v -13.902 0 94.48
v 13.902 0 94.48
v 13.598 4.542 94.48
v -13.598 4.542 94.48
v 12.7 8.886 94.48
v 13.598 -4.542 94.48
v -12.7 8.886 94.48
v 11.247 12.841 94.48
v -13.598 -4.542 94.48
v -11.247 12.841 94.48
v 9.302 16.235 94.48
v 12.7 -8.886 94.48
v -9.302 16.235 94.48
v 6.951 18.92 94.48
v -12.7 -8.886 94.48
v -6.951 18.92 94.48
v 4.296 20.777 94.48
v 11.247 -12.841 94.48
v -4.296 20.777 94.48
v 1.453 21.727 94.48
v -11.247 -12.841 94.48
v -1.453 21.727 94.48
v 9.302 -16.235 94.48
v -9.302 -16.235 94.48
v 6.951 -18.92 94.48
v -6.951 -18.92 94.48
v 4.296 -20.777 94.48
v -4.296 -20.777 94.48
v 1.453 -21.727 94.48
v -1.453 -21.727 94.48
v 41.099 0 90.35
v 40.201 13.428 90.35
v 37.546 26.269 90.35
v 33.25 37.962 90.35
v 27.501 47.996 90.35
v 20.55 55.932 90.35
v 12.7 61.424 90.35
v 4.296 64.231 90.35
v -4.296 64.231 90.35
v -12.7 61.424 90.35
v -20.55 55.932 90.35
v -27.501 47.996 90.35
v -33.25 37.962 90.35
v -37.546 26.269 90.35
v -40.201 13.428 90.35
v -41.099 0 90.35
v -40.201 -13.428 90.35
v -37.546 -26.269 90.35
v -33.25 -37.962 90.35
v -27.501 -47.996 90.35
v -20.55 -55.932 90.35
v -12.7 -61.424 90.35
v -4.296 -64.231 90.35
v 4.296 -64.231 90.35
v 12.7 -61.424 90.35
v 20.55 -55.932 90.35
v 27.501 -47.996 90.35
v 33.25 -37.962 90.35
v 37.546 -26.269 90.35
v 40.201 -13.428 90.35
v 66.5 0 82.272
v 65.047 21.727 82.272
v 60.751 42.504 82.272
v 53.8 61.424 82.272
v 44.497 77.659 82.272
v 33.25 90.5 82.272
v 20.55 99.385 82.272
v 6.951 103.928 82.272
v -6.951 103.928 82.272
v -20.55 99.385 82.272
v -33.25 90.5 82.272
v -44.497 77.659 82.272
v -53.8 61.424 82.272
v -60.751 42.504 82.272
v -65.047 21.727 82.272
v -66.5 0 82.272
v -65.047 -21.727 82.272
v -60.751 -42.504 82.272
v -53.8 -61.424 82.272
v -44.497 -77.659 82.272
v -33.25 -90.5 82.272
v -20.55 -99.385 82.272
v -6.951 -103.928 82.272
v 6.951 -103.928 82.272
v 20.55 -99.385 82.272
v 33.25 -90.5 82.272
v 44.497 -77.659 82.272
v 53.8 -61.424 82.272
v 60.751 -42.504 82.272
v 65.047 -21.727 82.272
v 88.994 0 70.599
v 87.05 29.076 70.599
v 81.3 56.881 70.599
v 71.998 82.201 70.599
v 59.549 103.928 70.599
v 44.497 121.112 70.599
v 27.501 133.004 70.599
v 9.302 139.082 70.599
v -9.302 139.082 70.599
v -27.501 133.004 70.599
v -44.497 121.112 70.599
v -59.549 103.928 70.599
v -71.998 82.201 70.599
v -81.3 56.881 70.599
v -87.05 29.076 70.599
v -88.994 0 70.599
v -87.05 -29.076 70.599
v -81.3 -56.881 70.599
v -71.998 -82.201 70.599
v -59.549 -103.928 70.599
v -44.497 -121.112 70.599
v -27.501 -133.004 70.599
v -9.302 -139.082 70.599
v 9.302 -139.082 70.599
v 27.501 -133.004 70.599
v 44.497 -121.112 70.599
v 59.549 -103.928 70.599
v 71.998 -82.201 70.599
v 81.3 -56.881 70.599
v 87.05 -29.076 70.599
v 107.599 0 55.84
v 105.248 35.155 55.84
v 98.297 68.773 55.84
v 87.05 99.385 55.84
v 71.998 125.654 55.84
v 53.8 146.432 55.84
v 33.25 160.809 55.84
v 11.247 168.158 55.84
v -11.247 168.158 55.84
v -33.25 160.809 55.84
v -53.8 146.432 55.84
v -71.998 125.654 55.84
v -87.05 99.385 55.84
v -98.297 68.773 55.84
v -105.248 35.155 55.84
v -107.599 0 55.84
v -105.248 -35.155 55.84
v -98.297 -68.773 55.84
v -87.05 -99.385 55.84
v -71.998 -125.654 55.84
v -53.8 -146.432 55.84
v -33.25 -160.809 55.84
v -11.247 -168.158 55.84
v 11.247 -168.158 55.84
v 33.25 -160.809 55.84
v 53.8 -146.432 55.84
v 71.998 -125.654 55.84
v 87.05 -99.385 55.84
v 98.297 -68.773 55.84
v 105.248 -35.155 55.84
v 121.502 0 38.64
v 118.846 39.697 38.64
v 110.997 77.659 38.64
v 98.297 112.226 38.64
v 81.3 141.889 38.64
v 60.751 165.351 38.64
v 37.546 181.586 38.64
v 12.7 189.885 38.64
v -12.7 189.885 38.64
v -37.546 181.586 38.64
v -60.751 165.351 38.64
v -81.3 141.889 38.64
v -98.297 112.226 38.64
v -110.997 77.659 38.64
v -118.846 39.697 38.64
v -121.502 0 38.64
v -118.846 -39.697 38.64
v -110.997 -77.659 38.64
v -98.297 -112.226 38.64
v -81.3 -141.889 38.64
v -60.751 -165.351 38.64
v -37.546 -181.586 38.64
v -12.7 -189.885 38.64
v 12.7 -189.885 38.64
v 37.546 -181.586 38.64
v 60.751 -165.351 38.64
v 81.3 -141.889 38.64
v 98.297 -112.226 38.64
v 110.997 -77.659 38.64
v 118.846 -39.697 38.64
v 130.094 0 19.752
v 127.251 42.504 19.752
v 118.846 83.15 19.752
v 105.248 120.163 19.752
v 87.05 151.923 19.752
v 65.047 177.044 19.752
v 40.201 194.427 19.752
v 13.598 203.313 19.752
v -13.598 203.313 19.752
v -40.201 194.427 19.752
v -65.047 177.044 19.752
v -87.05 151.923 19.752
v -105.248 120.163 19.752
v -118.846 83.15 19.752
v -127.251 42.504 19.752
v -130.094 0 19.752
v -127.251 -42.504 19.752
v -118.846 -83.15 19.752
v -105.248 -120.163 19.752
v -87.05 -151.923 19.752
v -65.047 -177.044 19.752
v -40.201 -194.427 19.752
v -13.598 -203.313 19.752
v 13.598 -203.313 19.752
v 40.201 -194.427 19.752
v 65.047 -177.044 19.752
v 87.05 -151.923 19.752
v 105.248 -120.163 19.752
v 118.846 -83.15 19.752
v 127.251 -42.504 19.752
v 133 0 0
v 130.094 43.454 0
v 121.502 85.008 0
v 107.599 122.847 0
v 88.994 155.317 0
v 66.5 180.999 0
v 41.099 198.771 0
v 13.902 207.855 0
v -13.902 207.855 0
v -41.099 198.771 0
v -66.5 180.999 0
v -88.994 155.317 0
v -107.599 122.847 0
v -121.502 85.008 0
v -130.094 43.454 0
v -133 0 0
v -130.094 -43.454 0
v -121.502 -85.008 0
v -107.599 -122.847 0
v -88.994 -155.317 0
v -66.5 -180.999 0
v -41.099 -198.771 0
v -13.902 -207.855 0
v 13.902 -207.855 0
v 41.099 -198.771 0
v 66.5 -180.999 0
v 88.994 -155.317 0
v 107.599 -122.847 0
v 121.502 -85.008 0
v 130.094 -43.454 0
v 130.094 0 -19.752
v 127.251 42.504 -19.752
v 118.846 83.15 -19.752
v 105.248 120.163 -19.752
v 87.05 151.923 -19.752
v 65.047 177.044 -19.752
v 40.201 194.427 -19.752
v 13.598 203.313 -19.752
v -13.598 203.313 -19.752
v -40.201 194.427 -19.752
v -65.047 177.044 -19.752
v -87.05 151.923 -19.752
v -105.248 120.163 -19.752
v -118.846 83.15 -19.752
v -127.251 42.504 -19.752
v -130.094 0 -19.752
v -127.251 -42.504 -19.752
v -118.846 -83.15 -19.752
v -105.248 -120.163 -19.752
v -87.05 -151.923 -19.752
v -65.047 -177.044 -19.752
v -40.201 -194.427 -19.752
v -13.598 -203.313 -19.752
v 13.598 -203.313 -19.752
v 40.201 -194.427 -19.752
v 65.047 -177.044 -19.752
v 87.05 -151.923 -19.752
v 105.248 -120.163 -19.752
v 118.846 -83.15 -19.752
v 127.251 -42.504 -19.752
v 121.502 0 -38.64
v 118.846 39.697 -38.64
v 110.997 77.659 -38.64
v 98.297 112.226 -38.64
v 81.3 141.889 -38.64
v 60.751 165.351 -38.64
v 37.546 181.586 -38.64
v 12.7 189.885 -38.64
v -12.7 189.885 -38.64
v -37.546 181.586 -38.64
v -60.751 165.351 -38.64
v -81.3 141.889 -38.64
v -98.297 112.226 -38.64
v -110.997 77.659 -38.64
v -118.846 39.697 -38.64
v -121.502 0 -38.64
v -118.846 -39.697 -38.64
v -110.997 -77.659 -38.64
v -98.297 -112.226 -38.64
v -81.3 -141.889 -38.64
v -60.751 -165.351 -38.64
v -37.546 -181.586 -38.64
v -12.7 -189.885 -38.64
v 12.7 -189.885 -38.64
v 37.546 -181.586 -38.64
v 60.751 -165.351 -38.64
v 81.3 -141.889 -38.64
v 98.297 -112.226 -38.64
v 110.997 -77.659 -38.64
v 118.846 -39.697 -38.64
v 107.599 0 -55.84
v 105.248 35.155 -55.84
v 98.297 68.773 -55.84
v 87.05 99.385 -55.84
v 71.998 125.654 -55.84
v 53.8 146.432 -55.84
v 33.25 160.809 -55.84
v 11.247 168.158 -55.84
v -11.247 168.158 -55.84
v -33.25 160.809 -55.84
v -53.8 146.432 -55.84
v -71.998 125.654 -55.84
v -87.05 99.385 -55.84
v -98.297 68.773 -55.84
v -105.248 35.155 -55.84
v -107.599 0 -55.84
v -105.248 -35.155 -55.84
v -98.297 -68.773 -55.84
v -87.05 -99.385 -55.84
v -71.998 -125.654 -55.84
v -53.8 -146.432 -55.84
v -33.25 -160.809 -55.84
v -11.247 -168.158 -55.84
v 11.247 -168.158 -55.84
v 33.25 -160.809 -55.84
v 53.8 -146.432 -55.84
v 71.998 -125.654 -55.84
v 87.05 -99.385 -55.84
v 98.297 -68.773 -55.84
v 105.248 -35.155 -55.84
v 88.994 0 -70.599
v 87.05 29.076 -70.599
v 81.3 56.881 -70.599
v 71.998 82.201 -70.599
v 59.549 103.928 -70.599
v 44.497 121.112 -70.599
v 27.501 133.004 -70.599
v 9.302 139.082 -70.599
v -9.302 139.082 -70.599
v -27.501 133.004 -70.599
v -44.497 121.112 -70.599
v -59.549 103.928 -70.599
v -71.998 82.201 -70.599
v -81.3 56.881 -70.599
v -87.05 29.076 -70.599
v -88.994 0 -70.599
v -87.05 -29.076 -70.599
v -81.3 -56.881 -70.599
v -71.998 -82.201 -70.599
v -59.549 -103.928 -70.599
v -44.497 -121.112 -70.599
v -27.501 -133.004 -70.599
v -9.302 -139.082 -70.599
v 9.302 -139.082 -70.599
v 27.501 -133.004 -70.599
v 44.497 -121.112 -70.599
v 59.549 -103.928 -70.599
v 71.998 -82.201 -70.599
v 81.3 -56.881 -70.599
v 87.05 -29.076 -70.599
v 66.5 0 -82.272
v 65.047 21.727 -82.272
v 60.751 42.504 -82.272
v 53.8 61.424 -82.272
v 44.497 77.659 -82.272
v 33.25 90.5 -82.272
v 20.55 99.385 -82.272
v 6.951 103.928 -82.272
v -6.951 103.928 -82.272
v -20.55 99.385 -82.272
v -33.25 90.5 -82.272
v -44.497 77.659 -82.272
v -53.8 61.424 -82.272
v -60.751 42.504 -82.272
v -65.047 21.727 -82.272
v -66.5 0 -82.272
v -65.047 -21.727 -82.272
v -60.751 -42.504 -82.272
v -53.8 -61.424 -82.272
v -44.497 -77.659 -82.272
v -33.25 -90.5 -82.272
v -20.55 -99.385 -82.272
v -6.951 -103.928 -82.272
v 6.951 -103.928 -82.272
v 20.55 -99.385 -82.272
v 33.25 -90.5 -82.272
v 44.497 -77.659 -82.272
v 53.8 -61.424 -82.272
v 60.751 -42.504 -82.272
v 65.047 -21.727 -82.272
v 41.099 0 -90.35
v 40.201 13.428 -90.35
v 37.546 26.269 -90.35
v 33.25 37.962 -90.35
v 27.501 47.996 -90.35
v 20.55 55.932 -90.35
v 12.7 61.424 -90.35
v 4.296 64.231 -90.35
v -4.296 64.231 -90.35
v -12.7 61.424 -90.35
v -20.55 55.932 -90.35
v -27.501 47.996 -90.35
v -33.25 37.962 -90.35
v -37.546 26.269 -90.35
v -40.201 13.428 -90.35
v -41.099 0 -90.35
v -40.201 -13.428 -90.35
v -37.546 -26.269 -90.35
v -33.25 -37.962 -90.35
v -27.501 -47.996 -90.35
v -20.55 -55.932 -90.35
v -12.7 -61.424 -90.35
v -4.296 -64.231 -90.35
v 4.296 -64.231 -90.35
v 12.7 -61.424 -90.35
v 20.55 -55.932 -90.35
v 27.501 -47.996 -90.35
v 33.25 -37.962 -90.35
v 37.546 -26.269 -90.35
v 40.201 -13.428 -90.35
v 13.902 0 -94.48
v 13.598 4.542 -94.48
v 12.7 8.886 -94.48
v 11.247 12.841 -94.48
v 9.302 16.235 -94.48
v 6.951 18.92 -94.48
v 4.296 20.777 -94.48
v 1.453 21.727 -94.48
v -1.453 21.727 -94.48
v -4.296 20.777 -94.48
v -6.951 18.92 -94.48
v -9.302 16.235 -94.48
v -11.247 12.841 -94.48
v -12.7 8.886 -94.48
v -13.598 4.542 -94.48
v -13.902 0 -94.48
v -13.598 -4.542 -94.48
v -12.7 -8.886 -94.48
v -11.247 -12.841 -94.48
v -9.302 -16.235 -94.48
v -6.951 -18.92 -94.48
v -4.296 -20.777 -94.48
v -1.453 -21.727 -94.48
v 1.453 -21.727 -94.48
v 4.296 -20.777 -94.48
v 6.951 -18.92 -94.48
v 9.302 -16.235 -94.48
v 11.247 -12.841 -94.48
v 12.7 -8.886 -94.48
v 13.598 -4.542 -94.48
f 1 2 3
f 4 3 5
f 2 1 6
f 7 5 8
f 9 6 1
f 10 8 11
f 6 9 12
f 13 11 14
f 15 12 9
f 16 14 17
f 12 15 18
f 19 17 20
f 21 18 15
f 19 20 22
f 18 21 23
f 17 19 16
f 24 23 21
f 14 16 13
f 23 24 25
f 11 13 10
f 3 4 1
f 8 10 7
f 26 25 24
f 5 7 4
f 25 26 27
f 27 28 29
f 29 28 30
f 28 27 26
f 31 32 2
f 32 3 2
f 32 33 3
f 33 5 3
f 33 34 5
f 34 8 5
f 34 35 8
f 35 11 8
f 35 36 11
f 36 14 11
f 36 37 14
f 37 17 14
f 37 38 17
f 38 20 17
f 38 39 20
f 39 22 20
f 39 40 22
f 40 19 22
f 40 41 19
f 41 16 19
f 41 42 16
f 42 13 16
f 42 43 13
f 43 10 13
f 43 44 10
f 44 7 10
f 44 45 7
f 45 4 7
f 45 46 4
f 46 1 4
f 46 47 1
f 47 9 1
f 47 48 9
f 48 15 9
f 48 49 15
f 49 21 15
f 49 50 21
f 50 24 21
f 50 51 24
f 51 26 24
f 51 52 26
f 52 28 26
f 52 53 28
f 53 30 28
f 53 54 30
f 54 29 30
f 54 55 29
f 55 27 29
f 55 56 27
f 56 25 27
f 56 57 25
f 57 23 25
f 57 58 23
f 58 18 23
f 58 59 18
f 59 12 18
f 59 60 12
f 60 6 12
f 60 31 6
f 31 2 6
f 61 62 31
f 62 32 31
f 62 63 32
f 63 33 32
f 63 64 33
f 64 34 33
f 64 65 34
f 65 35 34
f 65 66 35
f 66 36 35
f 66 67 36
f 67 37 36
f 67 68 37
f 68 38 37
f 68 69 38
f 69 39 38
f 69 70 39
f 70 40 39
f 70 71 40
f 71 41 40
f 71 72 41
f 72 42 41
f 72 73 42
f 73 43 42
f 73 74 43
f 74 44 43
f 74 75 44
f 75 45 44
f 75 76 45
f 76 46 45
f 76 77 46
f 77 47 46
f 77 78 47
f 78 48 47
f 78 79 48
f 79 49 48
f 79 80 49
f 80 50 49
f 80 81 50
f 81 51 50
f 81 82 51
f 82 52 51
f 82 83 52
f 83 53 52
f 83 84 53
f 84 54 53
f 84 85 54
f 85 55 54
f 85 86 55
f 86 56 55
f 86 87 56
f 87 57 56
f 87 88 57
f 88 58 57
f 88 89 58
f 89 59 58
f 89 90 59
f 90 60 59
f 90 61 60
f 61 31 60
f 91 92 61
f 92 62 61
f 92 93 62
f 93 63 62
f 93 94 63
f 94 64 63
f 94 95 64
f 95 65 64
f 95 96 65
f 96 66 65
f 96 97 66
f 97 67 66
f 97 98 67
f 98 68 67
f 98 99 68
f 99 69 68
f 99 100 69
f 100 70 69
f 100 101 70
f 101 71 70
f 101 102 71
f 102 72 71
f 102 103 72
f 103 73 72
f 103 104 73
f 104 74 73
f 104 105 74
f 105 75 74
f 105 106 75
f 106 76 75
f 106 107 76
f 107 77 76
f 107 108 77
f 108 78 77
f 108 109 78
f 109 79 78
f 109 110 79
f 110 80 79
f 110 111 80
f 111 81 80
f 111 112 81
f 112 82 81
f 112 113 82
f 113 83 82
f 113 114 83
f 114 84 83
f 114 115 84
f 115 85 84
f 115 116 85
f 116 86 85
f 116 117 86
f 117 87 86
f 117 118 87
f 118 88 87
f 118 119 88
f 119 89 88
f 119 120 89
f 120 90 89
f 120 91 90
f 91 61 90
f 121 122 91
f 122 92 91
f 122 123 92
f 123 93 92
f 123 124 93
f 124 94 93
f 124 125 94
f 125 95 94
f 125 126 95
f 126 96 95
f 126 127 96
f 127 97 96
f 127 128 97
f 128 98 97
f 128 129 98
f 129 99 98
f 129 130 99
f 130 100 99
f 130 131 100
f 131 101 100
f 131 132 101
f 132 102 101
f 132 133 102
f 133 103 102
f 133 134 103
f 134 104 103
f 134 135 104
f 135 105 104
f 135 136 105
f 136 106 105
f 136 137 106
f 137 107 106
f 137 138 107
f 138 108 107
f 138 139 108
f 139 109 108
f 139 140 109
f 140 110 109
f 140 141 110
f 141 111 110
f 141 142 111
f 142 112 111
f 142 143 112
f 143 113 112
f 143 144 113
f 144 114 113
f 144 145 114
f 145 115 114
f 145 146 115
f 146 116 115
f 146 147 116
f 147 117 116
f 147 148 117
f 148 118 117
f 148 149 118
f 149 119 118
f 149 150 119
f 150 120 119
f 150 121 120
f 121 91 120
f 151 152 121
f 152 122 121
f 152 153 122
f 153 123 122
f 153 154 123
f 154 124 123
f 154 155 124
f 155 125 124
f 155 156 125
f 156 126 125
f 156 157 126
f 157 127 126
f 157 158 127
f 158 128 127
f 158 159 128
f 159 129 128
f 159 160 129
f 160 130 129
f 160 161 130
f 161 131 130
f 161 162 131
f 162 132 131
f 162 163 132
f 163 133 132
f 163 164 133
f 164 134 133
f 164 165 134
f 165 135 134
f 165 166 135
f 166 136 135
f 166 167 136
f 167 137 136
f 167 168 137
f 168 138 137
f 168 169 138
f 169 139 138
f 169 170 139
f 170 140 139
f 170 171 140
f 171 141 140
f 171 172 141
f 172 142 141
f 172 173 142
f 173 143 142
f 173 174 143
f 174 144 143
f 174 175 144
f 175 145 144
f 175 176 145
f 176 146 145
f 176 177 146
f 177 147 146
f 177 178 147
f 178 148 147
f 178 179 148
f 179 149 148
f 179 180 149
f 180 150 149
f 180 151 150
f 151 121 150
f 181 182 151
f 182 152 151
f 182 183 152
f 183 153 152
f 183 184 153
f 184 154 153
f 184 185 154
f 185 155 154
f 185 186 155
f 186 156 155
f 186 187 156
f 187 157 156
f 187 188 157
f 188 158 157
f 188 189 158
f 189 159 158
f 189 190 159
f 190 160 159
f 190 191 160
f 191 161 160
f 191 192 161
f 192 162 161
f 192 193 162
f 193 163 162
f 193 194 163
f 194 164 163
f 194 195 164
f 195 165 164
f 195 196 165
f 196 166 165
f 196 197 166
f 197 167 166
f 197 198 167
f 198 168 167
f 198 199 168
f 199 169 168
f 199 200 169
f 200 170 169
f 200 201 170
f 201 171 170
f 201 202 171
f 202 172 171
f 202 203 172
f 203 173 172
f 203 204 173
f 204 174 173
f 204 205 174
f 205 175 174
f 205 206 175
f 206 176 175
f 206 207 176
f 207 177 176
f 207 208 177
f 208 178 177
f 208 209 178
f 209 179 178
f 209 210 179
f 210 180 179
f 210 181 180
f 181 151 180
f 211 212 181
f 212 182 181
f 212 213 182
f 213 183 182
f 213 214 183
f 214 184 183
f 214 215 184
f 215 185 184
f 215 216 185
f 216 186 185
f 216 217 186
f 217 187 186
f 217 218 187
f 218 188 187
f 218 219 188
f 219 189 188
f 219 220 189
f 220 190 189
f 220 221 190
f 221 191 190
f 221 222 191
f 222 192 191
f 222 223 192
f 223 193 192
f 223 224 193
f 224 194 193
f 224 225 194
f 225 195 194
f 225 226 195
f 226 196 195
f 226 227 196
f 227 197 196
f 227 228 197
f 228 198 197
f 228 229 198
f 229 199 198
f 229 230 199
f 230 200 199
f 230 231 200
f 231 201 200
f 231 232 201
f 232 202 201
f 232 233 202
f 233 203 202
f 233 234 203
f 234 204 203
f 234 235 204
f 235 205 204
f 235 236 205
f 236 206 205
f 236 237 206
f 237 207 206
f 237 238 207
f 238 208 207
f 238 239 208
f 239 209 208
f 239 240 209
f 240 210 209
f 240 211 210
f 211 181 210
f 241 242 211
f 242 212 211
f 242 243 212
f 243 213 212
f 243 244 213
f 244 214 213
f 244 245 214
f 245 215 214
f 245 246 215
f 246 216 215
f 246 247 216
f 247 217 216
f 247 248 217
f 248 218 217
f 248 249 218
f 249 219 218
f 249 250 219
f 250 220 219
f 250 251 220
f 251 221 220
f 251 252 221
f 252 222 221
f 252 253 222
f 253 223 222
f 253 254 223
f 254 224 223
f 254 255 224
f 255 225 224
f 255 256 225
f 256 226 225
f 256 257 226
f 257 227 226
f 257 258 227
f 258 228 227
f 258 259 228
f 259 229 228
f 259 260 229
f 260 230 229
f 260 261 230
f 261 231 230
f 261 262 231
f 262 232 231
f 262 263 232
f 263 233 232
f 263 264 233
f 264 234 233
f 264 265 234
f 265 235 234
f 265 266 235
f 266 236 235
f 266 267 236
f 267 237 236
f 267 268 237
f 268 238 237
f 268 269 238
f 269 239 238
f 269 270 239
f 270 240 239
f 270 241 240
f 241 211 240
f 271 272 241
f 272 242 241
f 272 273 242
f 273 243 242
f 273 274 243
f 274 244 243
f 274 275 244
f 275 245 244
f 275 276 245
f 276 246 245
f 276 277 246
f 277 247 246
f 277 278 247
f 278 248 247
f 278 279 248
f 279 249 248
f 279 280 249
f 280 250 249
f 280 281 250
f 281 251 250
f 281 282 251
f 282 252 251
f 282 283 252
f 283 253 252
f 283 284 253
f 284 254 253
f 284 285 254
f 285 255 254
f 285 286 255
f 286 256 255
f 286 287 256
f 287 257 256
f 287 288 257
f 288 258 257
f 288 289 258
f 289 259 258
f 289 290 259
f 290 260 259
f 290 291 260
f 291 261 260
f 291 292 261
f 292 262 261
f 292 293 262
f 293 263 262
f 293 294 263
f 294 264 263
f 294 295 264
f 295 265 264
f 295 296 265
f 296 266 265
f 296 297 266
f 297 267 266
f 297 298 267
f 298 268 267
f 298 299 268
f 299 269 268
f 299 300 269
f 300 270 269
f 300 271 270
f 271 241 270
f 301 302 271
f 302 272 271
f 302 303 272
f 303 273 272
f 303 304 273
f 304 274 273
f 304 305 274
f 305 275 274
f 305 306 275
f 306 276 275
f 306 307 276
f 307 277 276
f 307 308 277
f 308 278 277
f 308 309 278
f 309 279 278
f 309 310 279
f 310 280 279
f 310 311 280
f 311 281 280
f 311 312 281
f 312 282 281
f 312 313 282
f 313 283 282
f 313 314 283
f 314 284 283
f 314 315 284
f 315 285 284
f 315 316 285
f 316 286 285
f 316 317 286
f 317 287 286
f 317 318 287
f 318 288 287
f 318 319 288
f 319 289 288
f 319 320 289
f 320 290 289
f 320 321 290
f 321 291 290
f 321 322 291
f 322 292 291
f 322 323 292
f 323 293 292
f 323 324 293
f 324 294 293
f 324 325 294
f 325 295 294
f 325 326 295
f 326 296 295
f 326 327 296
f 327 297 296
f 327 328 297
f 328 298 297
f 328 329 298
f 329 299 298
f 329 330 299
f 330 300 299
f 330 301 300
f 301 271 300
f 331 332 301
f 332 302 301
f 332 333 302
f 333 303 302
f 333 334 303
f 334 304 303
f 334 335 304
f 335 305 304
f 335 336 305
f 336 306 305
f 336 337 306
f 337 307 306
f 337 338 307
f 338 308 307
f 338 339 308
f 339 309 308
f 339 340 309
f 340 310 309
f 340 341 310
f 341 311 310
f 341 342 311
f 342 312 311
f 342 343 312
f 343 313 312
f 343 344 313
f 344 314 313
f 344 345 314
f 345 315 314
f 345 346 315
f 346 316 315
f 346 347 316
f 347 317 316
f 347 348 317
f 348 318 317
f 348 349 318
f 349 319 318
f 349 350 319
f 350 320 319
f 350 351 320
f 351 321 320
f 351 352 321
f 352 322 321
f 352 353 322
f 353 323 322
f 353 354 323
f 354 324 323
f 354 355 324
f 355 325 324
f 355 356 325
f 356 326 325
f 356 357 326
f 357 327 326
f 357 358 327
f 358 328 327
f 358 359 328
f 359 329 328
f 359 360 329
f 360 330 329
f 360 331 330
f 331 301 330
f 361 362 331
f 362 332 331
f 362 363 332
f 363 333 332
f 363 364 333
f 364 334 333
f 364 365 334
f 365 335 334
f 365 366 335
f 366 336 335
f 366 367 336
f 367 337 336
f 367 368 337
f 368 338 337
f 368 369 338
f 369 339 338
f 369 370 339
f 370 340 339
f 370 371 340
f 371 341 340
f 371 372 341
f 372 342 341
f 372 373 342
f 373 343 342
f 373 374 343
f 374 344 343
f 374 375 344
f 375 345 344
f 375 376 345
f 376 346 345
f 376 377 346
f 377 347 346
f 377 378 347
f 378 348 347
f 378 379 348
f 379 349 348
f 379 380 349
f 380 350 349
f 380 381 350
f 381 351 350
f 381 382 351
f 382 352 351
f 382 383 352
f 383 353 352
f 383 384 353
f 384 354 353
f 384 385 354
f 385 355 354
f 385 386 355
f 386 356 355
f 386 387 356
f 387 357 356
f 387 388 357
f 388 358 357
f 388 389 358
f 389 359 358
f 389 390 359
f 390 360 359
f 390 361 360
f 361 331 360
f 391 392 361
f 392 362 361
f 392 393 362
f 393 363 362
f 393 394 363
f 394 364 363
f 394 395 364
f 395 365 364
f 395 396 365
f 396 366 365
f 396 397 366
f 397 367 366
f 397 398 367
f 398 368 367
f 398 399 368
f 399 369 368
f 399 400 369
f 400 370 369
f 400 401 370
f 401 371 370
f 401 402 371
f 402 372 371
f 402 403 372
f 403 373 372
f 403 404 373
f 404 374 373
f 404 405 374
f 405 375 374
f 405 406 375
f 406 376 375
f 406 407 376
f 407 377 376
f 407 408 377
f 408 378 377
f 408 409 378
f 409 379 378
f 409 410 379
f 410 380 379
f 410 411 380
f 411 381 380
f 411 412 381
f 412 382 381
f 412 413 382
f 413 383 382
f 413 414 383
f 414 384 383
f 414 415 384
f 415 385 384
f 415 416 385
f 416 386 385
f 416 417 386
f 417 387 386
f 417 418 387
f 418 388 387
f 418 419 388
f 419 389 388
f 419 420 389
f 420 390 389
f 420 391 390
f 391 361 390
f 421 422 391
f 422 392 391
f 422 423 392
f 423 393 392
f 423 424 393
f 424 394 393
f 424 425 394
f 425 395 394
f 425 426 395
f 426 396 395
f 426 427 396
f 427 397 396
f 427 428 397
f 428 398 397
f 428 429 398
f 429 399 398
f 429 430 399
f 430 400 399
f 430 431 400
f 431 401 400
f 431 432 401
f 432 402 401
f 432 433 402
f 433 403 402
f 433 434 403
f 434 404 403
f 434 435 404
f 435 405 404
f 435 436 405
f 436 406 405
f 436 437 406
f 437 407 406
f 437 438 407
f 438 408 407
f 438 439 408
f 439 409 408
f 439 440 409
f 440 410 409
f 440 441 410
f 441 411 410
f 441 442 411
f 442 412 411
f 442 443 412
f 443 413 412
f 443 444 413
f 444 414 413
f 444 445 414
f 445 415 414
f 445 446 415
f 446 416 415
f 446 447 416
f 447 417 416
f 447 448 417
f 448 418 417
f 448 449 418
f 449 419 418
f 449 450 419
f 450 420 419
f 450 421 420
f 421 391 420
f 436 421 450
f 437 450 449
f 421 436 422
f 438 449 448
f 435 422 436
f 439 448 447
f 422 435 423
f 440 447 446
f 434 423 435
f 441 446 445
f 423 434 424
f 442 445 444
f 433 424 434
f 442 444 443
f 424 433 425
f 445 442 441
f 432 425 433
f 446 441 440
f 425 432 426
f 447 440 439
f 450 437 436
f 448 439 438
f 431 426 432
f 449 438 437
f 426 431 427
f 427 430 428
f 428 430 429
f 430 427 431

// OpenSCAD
// Generated by SolidPython 1.0.1 on 2020-07-29 00:46:47


scale(v = [7, 11, 5]) {
	sphere(r = 19);
}
/***********************************************
*********      SolidPython code:      **********
************************************************
 
# import packages: SolidPython
from solid import *
from solid.utils import *
from itertools import chain, combinations, permutations


class Resize:

    def __init__(self, scad_file):
        self.scad_file = scad_file
        #self.scad_file = import_scad(scad_file)
        # cone/cylinder param:
        self.r1 = 0
        self.r2 = 0
        self.h = 0
        # rectangular prism param:
        self.w = 0
        self.l = 0
        # ellipse param:
        self.r = 0

    # import OpenScad code (file name corresponds to shape)


    # classify shape + parameters
    def assign(self, param1, param2, param3):
        if self.scad_file == 'cone.scad':
            self.r1 = param1
            self.r2 = param2
            self.h = param3
        elif self.scad_file == 'cylinder.scad':
            self.r1 = param1
            self.r2 = param2
            self.h = param3
        elif self.scad_file == 'rectangularPrism.scad':
            self.h = param1
            self.l = param2
            self.w = param3
        else:
            self.r = param1
            self.h = param2

    # resize parameters
    def iterate(self):
        x = range(3, 20, 2)
        i = 1
        if self.scad_file == 'cone.scad':
            tempList = list(permutations(x, 2))
            for temp in tempList:
                param1 = temp[0]
                param2 = temp[1]
                filepath = 'produced_scad_files/' + 'cone' + str(param1) + '_' + str(param2) + '_' + '.scad'
                scad_render_to_file(cylinder(h=param1, r1=param2, r2=0), filepath)

        elif self.scad_file == 'cylinder.scad':
            tempList = list(permutations(x, 3))
            for temp in tempList:
                param1 = temp[0]
                param2 = temp[1]
                filepath = 'produced_scad_files/' + 'cylinder' + str(param1) + '_' + str(param2) + '_' + '.scad'
                scad_render_to_file(cylinder(h=param1, r1=param2, r2=param2), filepath)

        elif self.scad_file == 'rectangularPrism.scad':
            tempList = list(permutations(x, 3))
            for temp in tempList:
                param1 = temp[0]
                param2 = temp[1]
                param3 = temp[2]
                filepath = 'produced_scad_files/' + 'rectangularPrism' + str(param1) + '_' + str(param2) + '_' + str(
                    param3) + '.scad'
                scad_render_to_file(cube(size=(param1, param2, param3)), filepath)

        elif self.scad_file == 'ellipse.scad':
            tempList = list(permutations(x, 4))
            for temp in tempList:
                param1 = temp[0]
                param2 = temp[1]
                param3 = temp[2]
                param4 = temp[3]
                filepath = 'produced_scad_files/' + 'ellipse' + str(param1) + '_' + str(param2) + '_' + str(param3) + '_' + str(param4) + '.scad'
                scad_render_to_file(scale([param1, param2, param3])(sphere(r=param4)), filepath)

    def render_to_scadfile(self):
        scad_render_to_file(scad, 'example.scad') 
 
************************************************/
